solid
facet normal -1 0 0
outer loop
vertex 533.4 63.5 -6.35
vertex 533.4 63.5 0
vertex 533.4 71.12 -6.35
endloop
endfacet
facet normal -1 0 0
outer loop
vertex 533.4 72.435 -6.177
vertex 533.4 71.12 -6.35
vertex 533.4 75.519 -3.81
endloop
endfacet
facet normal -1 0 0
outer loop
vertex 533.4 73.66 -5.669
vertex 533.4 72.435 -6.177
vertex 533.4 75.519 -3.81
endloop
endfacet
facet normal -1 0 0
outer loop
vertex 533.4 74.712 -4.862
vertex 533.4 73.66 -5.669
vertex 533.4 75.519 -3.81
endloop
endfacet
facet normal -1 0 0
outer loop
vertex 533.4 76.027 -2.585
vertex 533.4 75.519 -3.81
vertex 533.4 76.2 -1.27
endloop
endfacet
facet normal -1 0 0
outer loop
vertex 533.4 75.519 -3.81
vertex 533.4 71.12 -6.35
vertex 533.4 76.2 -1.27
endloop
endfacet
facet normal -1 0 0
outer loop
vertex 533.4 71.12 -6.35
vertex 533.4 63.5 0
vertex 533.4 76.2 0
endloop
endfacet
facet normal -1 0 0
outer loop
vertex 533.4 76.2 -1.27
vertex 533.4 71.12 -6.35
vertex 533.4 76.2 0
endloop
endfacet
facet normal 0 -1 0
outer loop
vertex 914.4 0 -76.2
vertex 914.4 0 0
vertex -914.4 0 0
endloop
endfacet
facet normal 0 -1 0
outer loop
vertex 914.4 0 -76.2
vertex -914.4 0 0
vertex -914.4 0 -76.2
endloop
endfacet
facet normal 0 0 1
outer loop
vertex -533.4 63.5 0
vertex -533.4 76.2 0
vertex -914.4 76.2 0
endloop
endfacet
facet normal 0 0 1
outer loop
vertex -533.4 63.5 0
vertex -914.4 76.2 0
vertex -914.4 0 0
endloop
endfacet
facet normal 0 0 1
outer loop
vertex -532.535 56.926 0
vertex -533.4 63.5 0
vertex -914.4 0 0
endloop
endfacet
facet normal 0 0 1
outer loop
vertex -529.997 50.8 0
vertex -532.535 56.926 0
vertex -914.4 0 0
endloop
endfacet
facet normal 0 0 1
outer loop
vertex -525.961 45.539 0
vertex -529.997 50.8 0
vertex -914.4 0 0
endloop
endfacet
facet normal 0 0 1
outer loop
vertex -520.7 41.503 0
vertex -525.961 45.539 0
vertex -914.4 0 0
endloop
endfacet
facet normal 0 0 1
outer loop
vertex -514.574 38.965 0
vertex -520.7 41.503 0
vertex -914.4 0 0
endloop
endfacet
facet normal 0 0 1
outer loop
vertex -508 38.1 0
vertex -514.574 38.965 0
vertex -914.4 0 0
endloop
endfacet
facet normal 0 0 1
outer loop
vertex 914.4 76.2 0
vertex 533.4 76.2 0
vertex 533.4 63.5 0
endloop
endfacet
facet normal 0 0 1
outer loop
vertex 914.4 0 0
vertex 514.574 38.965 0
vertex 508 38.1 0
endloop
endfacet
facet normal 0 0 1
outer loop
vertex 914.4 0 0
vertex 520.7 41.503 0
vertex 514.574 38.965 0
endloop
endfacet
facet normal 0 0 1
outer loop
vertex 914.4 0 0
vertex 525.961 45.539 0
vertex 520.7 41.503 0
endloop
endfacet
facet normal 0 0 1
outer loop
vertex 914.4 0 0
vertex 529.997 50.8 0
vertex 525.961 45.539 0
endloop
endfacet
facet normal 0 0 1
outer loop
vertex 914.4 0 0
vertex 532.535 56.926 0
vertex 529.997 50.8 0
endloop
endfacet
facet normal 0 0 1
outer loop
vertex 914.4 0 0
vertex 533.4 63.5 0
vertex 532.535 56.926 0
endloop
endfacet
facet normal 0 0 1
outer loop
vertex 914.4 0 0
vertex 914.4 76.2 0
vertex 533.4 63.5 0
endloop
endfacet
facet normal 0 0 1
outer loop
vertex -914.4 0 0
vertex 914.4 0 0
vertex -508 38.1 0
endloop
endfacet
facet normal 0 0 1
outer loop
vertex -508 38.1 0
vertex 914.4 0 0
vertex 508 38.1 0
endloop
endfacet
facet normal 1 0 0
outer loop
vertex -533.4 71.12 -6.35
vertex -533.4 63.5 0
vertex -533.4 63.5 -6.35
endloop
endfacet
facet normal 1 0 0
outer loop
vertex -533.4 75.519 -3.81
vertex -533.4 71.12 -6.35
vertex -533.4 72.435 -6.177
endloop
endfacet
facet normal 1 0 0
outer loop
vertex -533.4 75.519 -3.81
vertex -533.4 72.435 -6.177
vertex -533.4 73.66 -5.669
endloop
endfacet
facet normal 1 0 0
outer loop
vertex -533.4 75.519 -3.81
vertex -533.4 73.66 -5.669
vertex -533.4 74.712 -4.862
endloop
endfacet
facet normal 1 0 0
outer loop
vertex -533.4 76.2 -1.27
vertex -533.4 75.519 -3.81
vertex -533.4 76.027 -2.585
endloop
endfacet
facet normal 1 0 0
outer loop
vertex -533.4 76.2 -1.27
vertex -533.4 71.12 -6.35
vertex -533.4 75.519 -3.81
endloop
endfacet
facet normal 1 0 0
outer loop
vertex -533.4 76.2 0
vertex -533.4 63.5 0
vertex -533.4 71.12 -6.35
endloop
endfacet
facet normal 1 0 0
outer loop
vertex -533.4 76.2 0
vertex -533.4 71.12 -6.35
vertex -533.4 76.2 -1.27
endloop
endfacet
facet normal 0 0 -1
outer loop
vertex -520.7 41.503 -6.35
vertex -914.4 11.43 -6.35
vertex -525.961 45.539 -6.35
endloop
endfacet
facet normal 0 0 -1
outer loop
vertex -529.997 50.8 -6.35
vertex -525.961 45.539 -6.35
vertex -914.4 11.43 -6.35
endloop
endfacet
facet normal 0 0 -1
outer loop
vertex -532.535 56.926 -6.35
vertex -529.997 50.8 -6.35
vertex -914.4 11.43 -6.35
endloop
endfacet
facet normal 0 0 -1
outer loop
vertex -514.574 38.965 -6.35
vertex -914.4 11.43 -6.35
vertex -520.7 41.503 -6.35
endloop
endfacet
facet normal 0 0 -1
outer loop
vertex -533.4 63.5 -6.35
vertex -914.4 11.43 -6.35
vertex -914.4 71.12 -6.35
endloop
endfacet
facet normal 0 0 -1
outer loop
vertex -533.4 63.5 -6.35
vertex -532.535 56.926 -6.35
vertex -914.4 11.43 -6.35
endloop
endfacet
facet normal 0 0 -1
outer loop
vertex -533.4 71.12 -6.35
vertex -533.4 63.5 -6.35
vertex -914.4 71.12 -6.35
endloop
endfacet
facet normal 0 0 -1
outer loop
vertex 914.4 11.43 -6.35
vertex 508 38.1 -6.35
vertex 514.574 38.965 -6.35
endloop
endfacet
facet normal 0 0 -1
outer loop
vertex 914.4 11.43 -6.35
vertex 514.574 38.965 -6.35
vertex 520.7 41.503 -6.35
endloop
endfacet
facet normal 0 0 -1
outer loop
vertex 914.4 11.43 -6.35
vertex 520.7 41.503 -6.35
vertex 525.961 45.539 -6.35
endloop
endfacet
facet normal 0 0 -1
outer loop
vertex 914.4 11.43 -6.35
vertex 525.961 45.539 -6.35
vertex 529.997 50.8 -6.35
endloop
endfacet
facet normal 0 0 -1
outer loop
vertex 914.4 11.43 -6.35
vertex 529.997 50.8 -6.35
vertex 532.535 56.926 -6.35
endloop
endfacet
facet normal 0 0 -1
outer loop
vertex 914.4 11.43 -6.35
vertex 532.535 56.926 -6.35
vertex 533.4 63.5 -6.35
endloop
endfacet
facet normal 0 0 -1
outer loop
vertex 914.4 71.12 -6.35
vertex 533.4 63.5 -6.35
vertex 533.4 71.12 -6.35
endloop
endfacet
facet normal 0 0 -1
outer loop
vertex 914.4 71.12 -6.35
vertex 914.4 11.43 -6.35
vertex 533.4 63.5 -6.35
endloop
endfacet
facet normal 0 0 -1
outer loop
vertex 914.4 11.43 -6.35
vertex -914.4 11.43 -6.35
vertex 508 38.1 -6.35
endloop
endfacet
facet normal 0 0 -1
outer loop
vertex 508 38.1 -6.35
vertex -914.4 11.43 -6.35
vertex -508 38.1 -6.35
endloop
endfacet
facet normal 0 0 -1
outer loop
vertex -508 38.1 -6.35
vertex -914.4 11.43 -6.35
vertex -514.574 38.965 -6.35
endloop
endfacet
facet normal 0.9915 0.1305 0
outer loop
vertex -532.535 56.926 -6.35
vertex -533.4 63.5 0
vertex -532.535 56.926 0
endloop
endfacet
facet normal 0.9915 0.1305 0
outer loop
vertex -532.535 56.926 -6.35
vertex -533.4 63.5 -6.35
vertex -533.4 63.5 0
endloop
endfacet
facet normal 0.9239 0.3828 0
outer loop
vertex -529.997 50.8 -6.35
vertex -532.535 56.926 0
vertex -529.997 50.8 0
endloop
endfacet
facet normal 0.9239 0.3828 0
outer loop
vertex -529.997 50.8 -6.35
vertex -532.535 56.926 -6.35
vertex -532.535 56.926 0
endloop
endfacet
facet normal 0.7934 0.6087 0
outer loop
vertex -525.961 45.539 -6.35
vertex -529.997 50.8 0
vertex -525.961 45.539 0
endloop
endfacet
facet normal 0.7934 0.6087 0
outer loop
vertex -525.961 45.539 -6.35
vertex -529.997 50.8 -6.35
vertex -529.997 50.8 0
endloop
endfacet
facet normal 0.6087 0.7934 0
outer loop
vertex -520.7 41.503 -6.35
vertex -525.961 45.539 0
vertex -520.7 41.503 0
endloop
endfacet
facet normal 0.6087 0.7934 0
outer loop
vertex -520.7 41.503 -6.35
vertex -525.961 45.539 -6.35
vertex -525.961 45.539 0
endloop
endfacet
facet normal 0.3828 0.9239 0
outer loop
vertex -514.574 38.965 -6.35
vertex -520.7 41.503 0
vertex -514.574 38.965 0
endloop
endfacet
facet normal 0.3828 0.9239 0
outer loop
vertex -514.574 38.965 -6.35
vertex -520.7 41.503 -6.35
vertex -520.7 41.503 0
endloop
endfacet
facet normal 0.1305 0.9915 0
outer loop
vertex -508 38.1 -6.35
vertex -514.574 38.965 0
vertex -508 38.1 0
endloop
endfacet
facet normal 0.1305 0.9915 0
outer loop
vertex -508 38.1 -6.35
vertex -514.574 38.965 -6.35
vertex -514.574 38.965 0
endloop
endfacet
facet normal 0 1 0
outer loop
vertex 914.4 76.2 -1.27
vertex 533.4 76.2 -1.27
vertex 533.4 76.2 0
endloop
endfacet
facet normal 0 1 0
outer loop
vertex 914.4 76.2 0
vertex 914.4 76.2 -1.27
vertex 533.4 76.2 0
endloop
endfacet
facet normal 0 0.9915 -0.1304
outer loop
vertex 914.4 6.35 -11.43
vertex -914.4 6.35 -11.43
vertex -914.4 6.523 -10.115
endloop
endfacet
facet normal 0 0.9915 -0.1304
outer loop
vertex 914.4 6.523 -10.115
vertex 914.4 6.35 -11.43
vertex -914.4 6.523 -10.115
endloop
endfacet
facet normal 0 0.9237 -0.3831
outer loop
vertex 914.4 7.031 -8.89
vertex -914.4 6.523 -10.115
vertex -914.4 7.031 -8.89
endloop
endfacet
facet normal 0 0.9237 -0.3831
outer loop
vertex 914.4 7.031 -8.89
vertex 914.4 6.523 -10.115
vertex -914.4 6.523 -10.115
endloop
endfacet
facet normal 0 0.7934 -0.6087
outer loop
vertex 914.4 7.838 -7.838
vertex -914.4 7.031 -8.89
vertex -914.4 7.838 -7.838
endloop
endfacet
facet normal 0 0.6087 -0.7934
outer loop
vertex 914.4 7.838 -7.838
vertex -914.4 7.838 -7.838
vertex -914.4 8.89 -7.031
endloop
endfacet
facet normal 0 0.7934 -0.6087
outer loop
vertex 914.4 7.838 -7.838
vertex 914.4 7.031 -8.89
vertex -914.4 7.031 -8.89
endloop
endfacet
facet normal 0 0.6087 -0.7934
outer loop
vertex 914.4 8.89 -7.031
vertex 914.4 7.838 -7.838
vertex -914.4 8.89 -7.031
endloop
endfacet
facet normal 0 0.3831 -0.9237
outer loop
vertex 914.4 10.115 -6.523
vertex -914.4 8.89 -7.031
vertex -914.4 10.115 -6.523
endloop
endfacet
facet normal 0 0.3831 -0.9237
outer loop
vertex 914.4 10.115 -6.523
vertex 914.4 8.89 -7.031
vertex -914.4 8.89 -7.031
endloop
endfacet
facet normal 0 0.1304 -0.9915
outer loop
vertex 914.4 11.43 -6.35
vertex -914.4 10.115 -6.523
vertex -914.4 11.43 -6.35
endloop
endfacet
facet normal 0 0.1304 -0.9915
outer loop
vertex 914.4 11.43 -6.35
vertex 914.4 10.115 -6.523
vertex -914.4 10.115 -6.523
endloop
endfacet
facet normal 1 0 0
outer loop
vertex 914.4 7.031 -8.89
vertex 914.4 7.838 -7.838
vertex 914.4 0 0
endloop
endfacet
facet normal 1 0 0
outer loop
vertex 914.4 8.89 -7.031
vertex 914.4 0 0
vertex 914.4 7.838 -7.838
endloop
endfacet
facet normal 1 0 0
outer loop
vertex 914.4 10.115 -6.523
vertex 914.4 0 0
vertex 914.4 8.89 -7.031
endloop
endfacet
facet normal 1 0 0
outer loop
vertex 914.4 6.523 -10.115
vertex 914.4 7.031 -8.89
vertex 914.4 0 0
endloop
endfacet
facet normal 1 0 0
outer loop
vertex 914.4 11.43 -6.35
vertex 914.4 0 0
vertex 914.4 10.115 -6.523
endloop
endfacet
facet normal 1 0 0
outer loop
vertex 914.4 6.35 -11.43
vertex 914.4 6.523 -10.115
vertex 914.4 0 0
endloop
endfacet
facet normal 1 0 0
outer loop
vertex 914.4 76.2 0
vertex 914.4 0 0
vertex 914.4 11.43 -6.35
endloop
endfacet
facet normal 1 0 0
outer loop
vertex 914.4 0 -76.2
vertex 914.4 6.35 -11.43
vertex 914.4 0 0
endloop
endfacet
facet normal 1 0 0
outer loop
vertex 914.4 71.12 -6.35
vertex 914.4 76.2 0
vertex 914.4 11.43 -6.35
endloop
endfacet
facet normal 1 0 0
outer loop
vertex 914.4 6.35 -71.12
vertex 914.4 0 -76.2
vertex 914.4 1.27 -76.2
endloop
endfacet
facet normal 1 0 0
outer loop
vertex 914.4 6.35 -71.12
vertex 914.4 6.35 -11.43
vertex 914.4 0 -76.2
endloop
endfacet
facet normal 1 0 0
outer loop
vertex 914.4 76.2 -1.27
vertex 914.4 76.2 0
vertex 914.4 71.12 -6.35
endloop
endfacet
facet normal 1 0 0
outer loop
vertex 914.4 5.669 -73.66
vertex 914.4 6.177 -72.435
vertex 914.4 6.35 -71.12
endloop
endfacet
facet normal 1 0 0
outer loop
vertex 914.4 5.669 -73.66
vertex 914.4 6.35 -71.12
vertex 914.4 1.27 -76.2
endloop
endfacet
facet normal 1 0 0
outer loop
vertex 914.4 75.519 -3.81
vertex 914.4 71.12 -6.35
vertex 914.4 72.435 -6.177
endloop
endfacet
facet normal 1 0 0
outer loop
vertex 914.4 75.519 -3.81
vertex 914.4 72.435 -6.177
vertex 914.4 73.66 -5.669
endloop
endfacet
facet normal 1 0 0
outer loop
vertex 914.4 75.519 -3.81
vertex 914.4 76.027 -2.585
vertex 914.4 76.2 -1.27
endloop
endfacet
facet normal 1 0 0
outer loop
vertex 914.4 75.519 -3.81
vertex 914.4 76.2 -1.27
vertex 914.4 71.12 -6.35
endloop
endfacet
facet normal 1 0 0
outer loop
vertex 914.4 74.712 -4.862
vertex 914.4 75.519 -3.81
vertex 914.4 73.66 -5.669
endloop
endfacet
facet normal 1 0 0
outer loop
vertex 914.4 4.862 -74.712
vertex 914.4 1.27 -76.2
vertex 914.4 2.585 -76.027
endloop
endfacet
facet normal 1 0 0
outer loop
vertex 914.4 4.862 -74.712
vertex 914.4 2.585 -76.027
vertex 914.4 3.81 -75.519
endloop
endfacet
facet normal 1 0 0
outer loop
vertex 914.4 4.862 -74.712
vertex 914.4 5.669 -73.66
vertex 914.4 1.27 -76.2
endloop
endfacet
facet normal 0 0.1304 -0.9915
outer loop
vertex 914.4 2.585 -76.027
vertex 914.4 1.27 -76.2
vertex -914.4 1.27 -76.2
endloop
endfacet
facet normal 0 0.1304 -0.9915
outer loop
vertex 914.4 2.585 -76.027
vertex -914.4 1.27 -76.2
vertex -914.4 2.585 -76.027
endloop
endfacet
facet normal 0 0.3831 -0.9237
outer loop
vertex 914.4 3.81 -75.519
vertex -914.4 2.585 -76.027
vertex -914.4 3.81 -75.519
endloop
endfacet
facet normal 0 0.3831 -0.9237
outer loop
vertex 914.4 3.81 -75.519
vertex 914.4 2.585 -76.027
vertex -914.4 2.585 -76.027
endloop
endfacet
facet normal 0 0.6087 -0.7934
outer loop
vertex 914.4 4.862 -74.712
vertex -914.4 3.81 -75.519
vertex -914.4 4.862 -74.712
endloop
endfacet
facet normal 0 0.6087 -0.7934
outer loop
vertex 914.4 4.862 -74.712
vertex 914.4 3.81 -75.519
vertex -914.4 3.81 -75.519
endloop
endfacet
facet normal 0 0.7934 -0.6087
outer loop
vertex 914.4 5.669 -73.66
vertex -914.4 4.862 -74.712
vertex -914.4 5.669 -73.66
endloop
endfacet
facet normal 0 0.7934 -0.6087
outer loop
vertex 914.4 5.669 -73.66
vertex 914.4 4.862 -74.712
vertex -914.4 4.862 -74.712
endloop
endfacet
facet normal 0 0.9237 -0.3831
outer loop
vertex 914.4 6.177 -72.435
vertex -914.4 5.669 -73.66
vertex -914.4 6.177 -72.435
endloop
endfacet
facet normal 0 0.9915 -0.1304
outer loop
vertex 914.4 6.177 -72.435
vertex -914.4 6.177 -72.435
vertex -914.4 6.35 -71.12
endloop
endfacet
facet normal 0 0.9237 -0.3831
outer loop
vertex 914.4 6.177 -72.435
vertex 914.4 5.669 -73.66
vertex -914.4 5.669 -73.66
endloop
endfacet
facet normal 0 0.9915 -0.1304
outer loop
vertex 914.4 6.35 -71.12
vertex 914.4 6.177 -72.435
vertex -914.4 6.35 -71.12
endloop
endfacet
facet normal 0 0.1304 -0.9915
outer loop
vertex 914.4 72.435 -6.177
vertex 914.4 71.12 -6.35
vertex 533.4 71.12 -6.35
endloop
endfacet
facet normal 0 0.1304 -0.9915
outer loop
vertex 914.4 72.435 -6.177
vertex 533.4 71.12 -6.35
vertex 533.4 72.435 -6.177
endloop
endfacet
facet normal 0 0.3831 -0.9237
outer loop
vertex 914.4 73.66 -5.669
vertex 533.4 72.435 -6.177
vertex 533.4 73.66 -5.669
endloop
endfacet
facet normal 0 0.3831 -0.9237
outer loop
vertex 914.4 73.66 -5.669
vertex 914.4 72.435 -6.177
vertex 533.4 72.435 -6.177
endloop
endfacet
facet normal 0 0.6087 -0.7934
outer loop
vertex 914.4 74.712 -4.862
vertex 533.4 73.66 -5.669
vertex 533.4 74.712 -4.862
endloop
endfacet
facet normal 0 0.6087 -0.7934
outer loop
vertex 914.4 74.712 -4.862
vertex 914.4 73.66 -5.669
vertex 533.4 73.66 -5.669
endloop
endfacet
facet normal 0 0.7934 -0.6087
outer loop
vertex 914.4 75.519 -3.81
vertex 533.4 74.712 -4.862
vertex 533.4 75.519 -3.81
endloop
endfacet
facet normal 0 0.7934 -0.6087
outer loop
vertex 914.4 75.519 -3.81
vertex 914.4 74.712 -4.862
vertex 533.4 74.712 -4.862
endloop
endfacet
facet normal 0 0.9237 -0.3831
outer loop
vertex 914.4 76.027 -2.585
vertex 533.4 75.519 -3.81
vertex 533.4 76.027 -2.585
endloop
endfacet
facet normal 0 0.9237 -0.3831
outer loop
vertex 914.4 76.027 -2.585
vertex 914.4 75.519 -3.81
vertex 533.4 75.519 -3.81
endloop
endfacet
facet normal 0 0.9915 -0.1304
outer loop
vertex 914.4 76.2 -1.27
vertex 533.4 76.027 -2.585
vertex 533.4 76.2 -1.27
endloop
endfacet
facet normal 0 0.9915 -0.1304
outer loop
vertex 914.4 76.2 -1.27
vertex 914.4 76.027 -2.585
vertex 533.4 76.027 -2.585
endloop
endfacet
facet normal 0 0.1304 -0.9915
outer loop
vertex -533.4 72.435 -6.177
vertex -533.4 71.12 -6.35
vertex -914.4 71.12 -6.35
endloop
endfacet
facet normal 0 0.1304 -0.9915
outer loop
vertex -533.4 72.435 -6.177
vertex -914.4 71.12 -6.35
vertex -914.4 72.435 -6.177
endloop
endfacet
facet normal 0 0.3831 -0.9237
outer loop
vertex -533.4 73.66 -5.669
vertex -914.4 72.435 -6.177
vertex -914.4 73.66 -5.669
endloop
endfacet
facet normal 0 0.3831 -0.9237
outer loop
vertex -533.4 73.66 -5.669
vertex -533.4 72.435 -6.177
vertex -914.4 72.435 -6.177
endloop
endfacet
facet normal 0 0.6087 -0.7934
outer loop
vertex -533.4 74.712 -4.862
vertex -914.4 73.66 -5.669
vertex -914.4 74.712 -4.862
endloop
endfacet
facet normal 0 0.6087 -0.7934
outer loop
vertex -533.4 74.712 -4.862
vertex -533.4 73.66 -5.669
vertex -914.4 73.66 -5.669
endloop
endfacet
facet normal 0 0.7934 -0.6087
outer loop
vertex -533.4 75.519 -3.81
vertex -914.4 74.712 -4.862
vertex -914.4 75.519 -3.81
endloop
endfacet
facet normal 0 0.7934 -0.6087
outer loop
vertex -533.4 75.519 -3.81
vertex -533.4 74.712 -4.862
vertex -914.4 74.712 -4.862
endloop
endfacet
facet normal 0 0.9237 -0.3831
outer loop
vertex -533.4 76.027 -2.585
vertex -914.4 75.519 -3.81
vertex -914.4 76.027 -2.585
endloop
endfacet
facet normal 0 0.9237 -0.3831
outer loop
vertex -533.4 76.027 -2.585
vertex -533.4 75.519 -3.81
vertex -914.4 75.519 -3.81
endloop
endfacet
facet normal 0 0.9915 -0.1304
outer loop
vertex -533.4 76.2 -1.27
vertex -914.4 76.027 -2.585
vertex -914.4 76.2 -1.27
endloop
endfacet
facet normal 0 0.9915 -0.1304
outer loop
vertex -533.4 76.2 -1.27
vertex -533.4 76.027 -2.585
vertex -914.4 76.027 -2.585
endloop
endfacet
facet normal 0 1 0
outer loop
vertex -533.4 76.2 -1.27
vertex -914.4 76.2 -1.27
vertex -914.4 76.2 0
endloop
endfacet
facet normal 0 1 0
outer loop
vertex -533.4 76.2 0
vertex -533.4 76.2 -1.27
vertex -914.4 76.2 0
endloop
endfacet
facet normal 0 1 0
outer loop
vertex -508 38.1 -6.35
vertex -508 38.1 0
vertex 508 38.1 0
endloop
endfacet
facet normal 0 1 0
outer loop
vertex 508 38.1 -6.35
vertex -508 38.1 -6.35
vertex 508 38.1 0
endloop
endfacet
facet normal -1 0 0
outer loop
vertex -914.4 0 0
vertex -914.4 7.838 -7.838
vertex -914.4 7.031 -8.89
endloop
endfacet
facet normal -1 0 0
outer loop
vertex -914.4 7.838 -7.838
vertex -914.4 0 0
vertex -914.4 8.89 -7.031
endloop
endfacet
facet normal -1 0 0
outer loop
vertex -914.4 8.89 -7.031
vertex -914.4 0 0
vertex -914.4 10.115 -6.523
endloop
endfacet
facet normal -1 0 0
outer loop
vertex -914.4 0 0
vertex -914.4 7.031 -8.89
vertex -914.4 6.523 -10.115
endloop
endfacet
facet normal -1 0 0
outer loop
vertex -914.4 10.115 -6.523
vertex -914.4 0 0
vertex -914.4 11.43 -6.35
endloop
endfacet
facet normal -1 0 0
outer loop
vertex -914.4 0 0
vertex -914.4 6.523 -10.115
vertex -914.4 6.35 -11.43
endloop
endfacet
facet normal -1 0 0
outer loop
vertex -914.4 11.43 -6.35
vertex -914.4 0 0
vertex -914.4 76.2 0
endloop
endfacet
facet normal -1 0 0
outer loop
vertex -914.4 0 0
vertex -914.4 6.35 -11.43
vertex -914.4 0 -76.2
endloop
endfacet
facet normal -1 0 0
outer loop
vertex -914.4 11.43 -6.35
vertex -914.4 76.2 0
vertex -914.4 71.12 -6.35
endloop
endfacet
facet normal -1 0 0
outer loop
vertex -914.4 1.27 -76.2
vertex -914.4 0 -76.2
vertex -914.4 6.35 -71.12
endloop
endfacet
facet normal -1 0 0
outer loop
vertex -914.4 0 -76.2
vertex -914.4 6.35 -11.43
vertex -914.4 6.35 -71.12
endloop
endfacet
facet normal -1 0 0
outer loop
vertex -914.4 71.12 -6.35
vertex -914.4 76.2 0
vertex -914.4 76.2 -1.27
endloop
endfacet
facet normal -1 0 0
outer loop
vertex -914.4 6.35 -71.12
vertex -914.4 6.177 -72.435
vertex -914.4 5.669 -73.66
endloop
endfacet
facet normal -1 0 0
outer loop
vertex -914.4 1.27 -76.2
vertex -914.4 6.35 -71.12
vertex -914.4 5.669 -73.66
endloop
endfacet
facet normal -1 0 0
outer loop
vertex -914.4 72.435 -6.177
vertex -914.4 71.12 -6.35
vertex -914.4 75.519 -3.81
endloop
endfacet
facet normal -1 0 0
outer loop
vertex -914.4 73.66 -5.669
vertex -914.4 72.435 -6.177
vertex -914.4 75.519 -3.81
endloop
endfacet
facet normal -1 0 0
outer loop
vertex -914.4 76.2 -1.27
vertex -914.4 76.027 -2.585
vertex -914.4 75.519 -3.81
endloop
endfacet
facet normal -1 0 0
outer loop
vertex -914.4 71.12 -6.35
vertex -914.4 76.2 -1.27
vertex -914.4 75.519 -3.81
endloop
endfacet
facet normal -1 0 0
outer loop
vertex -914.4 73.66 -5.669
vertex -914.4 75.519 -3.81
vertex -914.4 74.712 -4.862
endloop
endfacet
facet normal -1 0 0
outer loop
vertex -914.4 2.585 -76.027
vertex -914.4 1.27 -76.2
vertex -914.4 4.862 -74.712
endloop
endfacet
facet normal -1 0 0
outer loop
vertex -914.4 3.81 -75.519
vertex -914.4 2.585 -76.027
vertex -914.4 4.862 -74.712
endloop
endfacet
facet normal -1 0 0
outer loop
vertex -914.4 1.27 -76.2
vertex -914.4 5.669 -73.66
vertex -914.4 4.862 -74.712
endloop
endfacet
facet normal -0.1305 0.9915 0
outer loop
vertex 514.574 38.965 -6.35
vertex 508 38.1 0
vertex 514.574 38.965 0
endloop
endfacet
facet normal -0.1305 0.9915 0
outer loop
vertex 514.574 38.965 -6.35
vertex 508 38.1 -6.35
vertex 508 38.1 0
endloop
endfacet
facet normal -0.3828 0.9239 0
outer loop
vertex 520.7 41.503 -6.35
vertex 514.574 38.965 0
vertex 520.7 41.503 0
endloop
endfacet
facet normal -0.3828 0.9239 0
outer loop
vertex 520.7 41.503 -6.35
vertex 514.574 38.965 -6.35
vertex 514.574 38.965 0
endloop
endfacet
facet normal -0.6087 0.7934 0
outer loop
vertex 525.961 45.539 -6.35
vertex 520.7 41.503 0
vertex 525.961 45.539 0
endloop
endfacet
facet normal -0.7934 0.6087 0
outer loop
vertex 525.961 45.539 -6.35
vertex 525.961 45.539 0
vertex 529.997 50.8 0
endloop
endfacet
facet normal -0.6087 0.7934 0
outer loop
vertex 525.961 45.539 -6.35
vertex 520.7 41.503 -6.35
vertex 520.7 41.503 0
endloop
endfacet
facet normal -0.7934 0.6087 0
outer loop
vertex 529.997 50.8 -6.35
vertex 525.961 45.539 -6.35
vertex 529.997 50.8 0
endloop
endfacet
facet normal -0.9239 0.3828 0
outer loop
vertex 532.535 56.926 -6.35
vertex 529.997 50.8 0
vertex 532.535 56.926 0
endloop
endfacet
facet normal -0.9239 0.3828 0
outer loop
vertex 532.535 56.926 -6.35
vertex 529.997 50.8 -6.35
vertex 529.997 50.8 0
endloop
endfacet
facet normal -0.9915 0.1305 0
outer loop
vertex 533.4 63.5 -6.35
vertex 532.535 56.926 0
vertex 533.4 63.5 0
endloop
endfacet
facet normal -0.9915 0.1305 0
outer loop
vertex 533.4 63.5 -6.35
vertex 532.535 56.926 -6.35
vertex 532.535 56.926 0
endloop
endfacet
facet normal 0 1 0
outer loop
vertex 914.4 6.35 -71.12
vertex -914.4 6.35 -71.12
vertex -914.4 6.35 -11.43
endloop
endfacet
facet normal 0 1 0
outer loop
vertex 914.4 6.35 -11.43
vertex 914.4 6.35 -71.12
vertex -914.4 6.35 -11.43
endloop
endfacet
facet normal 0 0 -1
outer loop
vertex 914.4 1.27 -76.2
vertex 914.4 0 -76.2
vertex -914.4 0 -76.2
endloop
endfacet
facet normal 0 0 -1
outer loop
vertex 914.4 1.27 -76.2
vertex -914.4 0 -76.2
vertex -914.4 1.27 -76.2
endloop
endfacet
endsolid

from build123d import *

# Parameters (mm, degrees)
BOSS_EXTRUDE1_DEPTH      = 914.4
BOSS_EXTRUDE1_DEPTH_BACK = 914.4
SKETCH2_W                = 1066.8
SKETCH2_H                = 38.1
CUT_EXTRUDE1_DEPTH       = 77.2
FILLET1_R                = 25.4


with BuildPart() as part:
    # Sketch1 → Boss-Extrude1 (new body, two sides)
    with BuildSketch(Plane(origin=(0, 0, 0), x_dir=(0, 0, -1), z_dir=(1, 0, 0))) as boss_extrude1_sk:
        with BuildLine():
            Line((0, 76.2), (0, 0))
            Line((0, 0), (76.2, 0))
            Line((76.2, 0), (76.2, 1.27))
            ThreePointArc((76.2, 1.27), (74.712102448, 4.862102448), (71.12, 6.35))
            Line((71.12, 6.35), (11.43, 6.35))
            ThreePointArc((11.43, 6.35), (7.837897552, 7.837897552), (6.35, 11.43))
            Line((6.35, 11.43), (6.35, 71.12))
            ThreePointArc((6.35, 71.12), (4.862102448, 74.712102448), (1.27, 76.2))
            Line((1.27, 76.2), (0, 76.2))
        make_face()
    extrude(amount=BOSS_EXTRUDE1_DEPTH)
    extrude(boss_extrude1_sk.sketch, amount=-BOSS_EXTRUDE1_DEPTH_BACK)

    # Sketch2 → Cut-Extrude1 (cut, through all)
    with BuildSketch(Plane.XY):
        with Locations((0, 57.15)):
            Rectangle(SKETCH2_W, SKETCH2_H)
    extrude(amount=-CUT_EXTRUDE1_DEPTH, mode=Mode.SUBTRACT)

    # Fillet1
    fillet1_edges = [part.edges().sort_by_distance(p)[0] for p in [
        (-533.4, 38.1, -3.175),
        (533.4, 38.1, -3.175),
    ]]
    fillet(fillet1_edges, radius=FILLET1_R)


solid = part.part
